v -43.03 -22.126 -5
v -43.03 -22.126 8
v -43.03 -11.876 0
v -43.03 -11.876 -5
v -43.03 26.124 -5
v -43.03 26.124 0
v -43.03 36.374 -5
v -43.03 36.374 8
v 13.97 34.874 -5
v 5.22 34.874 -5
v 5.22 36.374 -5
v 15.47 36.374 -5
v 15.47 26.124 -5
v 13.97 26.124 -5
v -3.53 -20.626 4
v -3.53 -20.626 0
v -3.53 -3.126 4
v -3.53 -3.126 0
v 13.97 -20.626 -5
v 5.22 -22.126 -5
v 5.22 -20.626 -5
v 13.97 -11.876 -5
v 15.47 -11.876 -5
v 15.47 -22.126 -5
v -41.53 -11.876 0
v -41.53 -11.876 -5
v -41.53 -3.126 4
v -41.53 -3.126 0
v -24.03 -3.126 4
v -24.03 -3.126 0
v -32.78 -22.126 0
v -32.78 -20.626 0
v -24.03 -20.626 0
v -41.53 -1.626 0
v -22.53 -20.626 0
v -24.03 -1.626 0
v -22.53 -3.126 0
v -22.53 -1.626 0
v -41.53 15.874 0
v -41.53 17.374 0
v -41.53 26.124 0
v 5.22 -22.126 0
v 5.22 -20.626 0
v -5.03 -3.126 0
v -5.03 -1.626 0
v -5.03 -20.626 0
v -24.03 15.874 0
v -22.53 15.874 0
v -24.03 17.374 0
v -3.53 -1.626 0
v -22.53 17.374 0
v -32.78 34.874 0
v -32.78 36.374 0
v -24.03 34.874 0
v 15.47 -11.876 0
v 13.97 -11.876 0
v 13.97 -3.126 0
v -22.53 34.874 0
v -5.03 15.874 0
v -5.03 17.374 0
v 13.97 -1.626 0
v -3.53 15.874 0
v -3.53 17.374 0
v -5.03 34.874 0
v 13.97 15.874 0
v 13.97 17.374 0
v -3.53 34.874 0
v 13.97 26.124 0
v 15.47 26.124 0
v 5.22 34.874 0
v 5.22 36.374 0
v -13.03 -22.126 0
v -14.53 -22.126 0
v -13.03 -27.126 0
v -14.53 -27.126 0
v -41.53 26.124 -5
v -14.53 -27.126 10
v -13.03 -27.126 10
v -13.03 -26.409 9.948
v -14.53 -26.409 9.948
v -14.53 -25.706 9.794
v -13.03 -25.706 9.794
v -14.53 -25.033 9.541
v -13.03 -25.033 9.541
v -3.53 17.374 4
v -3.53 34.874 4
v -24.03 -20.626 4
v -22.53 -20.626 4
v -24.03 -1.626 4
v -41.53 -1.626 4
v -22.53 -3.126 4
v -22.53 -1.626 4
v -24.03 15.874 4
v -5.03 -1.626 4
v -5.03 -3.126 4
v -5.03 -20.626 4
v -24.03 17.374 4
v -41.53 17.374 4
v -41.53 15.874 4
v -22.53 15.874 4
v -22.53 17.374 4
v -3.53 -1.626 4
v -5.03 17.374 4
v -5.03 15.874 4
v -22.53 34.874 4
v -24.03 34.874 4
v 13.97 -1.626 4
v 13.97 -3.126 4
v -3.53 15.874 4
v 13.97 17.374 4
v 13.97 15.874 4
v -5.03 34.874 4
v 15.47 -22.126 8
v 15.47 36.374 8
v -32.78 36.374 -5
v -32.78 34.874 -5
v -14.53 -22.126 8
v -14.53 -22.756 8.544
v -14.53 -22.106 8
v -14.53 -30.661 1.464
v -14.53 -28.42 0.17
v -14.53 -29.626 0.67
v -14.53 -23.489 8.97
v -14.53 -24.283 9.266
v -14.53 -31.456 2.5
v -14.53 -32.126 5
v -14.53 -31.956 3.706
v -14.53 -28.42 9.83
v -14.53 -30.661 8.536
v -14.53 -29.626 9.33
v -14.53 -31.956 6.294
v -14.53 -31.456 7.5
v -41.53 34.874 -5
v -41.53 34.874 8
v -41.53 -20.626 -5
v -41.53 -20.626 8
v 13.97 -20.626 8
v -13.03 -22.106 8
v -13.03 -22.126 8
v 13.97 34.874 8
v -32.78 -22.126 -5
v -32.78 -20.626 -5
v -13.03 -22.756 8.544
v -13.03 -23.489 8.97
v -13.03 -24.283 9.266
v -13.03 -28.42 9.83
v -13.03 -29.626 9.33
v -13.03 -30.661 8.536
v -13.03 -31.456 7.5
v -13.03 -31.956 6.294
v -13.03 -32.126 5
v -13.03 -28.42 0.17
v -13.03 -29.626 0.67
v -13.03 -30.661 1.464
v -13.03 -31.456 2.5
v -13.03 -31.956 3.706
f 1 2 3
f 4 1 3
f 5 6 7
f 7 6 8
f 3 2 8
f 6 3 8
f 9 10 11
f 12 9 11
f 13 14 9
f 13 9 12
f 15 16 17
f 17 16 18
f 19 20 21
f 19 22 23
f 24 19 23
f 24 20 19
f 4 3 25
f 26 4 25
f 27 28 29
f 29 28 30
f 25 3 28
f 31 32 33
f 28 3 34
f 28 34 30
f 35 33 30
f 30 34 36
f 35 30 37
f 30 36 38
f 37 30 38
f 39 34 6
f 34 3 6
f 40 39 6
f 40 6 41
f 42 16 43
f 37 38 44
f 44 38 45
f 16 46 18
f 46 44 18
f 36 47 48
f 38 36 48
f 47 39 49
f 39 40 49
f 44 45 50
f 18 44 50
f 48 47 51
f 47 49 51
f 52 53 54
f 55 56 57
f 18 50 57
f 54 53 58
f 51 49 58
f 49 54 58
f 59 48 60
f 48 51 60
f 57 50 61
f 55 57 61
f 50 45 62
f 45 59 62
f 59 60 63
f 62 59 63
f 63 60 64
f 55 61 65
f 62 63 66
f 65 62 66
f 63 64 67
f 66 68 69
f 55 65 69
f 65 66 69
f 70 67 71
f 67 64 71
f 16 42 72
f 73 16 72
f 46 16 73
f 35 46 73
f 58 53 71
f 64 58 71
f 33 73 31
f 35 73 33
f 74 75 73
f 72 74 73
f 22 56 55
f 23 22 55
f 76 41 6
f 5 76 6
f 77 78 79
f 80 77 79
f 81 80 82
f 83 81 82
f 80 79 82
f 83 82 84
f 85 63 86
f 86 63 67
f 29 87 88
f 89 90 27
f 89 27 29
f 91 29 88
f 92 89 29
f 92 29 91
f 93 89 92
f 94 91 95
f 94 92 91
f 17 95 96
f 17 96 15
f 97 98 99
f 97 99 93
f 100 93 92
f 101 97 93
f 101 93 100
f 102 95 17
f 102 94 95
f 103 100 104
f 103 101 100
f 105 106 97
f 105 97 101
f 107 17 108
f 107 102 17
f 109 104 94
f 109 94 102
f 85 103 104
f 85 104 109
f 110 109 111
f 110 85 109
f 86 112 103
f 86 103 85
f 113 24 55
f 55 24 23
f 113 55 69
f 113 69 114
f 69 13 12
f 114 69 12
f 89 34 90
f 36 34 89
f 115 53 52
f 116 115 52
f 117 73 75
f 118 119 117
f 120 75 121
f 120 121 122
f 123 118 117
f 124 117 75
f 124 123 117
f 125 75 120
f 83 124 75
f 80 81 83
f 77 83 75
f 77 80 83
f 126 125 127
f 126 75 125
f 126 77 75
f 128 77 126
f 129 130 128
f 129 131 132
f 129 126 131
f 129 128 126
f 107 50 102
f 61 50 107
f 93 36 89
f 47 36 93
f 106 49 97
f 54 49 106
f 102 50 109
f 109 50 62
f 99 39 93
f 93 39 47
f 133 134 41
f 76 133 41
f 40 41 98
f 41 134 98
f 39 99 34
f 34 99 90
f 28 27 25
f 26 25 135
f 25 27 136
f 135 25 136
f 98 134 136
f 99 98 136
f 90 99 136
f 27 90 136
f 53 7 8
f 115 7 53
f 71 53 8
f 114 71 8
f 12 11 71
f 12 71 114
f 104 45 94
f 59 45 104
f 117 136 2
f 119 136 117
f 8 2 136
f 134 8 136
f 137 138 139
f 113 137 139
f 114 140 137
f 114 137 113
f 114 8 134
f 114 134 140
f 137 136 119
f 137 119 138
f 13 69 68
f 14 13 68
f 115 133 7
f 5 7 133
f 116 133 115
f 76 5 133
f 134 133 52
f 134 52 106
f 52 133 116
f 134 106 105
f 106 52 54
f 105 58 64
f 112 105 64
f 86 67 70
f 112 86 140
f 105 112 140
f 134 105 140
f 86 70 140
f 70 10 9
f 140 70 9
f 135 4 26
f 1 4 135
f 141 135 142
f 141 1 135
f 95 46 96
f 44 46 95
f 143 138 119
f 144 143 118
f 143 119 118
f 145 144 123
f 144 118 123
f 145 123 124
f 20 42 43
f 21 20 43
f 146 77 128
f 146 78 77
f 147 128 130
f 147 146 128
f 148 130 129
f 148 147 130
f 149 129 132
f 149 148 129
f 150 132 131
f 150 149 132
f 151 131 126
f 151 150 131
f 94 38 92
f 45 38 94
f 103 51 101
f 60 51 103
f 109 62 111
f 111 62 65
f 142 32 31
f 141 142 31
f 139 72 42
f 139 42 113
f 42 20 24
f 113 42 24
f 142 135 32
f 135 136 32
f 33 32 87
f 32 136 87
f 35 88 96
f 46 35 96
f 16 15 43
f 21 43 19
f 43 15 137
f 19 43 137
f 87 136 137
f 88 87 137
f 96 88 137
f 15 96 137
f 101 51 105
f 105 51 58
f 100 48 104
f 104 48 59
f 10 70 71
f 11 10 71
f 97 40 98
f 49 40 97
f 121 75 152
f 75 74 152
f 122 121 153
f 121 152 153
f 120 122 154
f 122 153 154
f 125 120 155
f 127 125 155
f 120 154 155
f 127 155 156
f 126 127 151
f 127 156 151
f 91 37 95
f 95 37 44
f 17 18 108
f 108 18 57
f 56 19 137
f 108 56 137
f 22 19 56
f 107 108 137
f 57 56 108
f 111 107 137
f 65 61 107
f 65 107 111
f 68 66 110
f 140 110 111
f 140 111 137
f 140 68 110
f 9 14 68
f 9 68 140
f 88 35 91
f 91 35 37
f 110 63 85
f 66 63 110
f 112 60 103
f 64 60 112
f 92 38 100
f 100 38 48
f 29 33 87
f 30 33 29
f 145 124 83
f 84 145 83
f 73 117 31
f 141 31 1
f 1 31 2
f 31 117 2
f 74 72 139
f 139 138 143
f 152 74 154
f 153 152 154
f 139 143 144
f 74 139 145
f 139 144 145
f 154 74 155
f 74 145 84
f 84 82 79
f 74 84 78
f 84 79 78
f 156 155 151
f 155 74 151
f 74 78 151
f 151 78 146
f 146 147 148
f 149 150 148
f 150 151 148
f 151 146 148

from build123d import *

# Parameters (mm, degrees)
F0_W        = 58.5
F0_H        = 58.5
F0_W_2      = 17.5
F0_H_2      = 17.5
F1_DEPTH    = 4
F2_W        = 1.5
F2_H        = 10
F3_DEPTH    = 10
F4_R        = 4.99999
F6_DEPTH    = 1.5
F7_T1_DEPTH = 26.0435355486
F8_R        = 5
F9_W        = 58.5
F9_H        = 58.5
F9_W_2      = 55.5
F9_H_2      = 55.5
F10_DEPTH   = 4
F12_DEPTH   = 5


# Not quite as in the source:
# - a fillet or chamfer that OpenCascade refuses, or shapes differently, is made with other operations: its cross-section is extruded or revolved along the edge and cut away or added
# - a fillet or chamfer is up to 0.001 mm smaller than in the source, because OpenCascade refuses the exact size


with BuildPart() as f1:
    # F0 (on Top) → F1 (new body)
    with BuildSketch(Plane.XY):
        with Locations((-13.779699502, 7.1240415001)):
            Rectangle(F0_W, F0_H)
        with Locations((-32.779699502, -11.8759584999)):
            Rectangle(F0_W_2, F0_H_2, mode=Mode.SUBTRACT)
        with Locations((-13.779699502, -11.8759584999)):
            Rectangle(F0_W_2, F0_H_2, mode=Mode.SUBTRACT)
        with Locations((5.220300498, -11.8759584999)):
            Rectangle(F0_W_2, F0_H_2, mode=Mode.SUBTRACT)
        with Locations((-32.779699502, 7.1240415001)):
            Rectangle(F0_W_2, F0_H_2, mode=Mode.SUBTRACT)
        with Locations((-32.779699502, 26.1240415001)):
            Rectangle(F0_W_2, F0_H_2, mode=Mode.SUBTRACT)
        with Locations((-13.779699502, 7.1240415001)):
            Rectangle(F0_W_2, F0_H_2, mode=Mode.SUBTRACT)
        with Locations((5.220300498, 7.1240415001)):
            Rectangle(F0_W_2, F0_H_2, mode=Mode.SUBTRACT)
        with Locations((-13.779699502, 26.1240415001)):
            Rectangle(F0_W_2, F0_H_2, mode=Mode.SUBTRACT)
        with Locations((5.220300498, 26.1240415001)):
            Rectangle(F0_W_2, F0_H_2, mode=Mode.SUBTRACT)
    extrude(amount=F1_DEPTH)

    # F2 (on face) → F3 (join)
    with BuildSketch(Plane.XZ.offset(22.1259584999)):
        with Locations((-13.779699502, 5)):
            Rectangle(F2_W, F2_H)
    extrude(amount=F3_DEPTH)

    # F4 (radius 5 in the source; OpenCascade refuses exactly that, so slightly less here)
    f4_edges = [f1.edges().sort_by_distance(p)[0] for p in [
        (-13.7797, -32.125958, 10),
        (-13.7797, -32.125958, 0),
        (-13.7797, -22.125958, 10),
    ]]
    fillet(f4_edges, radius=F4_R)

    # F5 (on face) → F6 (join)
    with BuildSketch(Plane(origin=(-14.529699502, 0, 0), x_dir=(0, -1, 0), z_dir=(-1, 0, 0))):
        with BuildLine():
            Line((20.6259584999, 4), (22.1259584999, 4))
            Line((22.1259584999, 4), (22.1259584999, 5))
            ThreePointArc((22.1259584999, 5), (22.8099724149, 7.5243343902), (24.6748641453, 9.3579968409))
            Line((24.6748641453, 9.3579968409), (22.1259584999, 9.3579968409))
            Line((22.1259584999, 9.3579968409), (20.6259584999, 9.3579968409))
            Line((20.6259584999, 9.3579968409), (20.6259584999, 4))
        make_face()
    extrude(amount=-F6_DEPTH)

    # F7: fillet of radius 5 on 1 edges, made by hand

    # F7_s2 → F7_t1 (cut)
    with BuildSketch(Plane.YZ.offset(-26.8014672763)):
        with BuildLine():
            ThreePointArc((-20.6259584999, 4.4492897311), (-21.7687892868, 7.6308374145), (-24.6748567646, 9.3579968409))
            Line((-24.6748567646, 9.3579968409), (-24.6558347299, 9.4561709831))
            ThreePointArc((-24.6558347299, 9.4561709831), (-22.6504076323, 9.4579968409), (-20.6259584999, 9.4579968409))
            Line((-20.6259584999, 9.4579968409), (-20.5259584999, 9.3579968409))
            Line((-20.5259584999, 9.3579968409), (-20.5259584999, 4.4492897311))
            Line((-20.5259584999, 4.4492897311), (-20.6259584999, 4.4492897311))
        make_face()
    extrude(amount=F7_T1_DEPTH, mode=Mode.SUBTRACT)

    # F8
    f8_edges = [f1.edges().sort_by_distance(p)[0] for p in [
        (-13.7797, -24.674857, 9.357997),
    ]]
    fillet(f8_edges, radius=F8_R)

    # F9 (on face) → F10 (join)
    with BuildSketch(Plane.XY.offset(4)):
        with Locations((-13.779699502, 7.1240415001)):
            Rectangle(F9_W, F9_H)
        with Locations((-13.779699502, 7.1240415001)):
            Rectangle(F9_W_2, F9_H_2, mode=Mode.SUBTRACT)
    extrude(amount=F10_DEPTH)

    # F11 (on face) → F12 (join)
    with BuildSketch(Plane(origin=(0, 0, 0), x_dir=(1, 0, 0), z_dir=(0, 0, -1))):
        Polygon((-43.029699502, 11.8759584999), (-41.529699502, 11.8759584999), (-41.529699502, 20.6259584999), (-32.779699502, 20.6259584999), (-32.779699502, 22.1259584999), (-41.529699502, 22.1259584999), (-43.029699502, 22.1259584999), align=None)
        Polygon((5.220300498, 22.1259584999), (5.220300498, 20.6259584999), (13.970300498, 20.6259584999), (13.970300498, 11.8759584999), (15.470300498, 11.8759584999), (15.470300498, 22.1259584999), (13.970300498, 22.1259584999), align=None)
        Polygon((-43.029699502, -36.3740415001), (-32.779699502, -36.3740415001), (-32.779699502, -34.8740415001), (-41.529699502, -34.8740415001), (-41.529699502, -26.1240415001), (-43.029699502, -26.1240415001), (-43.029699502, -34.8740415001), align=None)
        Polygon((13.970300498, -34.8740415001), (5.220300498, -34.8740415001), (5.220300498, -36.3740415001), (15.470300498, -36.3740415001), (15.470300498, -34.8740415001), (15.470300498, -26.1240415001), (13.970300498, -26.1240415001), align=None)
    extrude(amount=F12_DEPTH)


solid = f1.part
